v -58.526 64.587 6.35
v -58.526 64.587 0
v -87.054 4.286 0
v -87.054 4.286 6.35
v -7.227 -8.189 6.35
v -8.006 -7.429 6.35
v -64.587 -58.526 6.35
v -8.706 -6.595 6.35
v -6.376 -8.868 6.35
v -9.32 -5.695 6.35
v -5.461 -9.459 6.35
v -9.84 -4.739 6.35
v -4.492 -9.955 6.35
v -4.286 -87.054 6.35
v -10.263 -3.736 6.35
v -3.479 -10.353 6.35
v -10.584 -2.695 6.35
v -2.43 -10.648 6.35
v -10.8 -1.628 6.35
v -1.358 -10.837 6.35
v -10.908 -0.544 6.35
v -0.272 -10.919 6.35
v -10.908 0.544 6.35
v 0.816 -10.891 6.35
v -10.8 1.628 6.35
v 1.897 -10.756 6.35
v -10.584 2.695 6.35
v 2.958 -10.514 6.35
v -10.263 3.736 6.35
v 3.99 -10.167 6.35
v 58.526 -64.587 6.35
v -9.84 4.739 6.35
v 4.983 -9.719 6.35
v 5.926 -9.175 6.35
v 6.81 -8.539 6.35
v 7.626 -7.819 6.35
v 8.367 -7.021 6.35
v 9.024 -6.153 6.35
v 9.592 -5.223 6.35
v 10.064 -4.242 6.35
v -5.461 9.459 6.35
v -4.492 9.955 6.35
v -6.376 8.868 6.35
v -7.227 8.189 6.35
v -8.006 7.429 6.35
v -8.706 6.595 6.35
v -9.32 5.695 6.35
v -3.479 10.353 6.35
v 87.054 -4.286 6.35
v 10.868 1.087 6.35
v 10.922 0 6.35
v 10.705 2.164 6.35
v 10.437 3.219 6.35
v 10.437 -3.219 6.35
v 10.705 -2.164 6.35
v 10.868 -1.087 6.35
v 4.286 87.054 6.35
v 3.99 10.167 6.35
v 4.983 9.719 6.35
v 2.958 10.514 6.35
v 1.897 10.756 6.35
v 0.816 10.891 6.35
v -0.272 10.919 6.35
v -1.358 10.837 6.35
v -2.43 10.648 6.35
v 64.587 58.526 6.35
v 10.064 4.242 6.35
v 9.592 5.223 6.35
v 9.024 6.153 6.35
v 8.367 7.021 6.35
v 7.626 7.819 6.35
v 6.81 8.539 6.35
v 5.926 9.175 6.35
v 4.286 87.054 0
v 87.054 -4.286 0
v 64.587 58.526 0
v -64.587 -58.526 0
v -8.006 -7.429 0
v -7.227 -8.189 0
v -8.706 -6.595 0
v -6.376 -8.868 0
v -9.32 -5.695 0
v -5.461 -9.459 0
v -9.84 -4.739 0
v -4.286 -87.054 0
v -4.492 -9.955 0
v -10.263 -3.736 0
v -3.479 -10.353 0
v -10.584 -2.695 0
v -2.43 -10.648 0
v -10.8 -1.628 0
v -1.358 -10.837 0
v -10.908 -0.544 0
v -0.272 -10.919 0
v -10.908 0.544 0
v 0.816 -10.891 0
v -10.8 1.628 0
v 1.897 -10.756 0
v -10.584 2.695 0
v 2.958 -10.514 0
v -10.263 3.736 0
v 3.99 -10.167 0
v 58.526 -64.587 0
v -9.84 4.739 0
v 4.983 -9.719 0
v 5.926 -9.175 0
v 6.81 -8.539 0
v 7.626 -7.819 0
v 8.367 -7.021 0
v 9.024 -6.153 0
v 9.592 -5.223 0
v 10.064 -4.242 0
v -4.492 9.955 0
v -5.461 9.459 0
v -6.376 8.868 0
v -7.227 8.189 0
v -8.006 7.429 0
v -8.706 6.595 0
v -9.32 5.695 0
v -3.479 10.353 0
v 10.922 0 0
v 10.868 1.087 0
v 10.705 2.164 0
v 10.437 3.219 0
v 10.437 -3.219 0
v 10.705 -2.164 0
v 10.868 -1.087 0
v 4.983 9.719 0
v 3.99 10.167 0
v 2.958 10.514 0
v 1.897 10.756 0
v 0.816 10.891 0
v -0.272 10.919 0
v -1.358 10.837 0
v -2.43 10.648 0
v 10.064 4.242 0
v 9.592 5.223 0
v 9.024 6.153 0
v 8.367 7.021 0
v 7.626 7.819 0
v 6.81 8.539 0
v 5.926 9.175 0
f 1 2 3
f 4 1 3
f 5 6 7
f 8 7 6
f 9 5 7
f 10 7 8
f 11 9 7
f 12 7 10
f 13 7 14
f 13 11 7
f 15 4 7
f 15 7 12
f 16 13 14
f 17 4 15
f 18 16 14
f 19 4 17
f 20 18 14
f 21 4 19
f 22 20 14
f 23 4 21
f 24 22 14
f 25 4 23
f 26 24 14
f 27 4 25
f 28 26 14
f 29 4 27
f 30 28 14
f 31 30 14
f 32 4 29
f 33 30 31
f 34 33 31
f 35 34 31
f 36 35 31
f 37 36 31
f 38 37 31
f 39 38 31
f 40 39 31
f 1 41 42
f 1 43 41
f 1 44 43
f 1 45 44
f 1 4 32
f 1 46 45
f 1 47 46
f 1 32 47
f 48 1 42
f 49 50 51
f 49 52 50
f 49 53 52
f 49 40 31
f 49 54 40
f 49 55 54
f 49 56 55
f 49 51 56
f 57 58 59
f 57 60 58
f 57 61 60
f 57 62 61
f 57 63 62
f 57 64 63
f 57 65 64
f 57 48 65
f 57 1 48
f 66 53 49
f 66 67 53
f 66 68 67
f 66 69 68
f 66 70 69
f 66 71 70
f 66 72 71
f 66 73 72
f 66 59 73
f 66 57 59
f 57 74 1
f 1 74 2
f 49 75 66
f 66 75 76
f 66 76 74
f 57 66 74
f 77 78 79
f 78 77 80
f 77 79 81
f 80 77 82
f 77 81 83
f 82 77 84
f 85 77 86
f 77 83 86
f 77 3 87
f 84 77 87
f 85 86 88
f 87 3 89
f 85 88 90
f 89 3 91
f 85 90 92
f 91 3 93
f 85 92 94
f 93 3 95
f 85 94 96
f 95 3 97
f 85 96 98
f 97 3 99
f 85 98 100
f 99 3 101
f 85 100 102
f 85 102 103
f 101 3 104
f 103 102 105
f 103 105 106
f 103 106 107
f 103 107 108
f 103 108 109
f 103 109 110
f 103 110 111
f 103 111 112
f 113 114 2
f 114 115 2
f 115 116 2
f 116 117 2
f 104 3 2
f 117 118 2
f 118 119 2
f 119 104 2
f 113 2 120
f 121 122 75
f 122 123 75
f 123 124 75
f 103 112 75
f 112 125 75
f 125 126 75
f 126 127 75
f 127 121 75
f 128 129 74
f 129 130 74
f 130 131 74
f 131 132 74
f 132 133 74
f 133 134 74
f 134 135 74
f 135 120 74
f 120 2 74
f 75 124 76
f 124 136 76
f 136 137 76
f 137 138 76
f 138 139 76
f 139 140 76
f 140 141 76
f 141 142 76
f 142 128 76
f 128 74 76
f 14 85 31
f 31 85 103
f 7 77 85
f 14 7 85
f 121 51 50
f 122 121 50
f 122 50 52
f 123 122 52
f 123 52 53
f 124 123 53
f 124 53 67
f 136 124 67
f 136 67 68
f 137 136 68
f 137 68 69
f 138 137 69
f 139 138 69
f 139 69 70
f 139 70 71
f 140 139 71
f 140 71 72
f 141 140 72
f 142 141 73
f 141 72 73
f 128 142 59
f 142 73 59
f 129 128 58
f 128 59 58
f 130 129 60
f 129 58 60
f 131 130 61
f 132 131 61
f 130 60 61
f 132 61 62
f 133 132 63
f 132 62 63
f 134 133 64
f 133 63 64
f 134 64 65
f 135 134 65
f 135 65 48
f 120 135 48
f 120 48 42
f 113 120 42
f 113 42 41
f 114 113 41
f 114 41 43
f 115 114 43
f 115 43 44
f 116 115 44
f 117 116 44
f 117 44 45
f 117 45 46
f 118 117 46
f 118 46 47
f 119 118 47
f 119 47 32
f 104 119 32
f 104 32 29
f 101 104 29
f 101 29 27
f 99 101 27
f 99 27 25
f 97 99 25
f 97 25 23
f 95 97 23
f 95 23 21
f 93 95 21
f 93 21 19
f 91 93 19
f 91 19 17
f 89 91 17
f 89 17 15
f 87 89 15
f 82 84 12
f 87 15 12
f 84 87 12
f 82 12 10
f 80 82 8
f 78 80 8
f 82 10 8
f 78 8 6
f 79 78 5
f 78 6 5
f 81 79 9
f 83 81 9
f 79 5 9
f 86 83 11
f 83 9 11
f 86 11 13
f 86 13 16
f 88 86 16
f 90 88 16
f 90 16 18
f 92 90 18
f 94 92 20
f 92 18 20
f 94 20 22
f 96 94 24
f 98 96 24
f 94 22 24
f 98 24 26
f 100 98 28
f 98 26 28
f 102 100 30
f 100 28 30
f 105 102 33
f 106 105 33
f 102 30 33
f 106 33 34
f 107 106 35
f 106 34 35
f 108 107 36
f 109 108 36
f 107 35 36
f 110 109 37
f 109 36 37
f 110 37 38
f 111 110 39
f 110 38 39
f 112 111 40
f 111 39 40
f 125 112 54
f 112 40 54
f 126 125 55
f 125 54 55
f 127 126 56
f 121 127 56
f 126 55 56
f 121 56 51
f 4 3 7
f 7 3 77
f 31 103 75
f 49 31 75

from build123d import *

# Parameters (mm, degrees)
F1_DEPTH = 6.35
F2_R     = 10.922
F3_DEPTH = 25.4


with BuildPart() as f1:
    # F0 (on Top) → F1 (new body)
    with BuildSketch(Plane.XY):
        Polygon((-58.525931, 64.586785), (-87.053837, 4.285671), (-64.586785, -58.525931), (-4.285671, -87.053837), (58.525931, -64.586785), (87.053837, -4.285671), (64.586785, 58.525931), (4.285671, 87.053837), align=None)
    extrude(amount=F1_DEPTH)

    # F2 (on face) → F3 (cut)
    with BuildSketch(Plane.XY.offset(6.35)):
        Circle(F2_R)
    extrude(amount=-F3_DEPTH, mode=Mode.SUBTRACT)


solid = f1.part
